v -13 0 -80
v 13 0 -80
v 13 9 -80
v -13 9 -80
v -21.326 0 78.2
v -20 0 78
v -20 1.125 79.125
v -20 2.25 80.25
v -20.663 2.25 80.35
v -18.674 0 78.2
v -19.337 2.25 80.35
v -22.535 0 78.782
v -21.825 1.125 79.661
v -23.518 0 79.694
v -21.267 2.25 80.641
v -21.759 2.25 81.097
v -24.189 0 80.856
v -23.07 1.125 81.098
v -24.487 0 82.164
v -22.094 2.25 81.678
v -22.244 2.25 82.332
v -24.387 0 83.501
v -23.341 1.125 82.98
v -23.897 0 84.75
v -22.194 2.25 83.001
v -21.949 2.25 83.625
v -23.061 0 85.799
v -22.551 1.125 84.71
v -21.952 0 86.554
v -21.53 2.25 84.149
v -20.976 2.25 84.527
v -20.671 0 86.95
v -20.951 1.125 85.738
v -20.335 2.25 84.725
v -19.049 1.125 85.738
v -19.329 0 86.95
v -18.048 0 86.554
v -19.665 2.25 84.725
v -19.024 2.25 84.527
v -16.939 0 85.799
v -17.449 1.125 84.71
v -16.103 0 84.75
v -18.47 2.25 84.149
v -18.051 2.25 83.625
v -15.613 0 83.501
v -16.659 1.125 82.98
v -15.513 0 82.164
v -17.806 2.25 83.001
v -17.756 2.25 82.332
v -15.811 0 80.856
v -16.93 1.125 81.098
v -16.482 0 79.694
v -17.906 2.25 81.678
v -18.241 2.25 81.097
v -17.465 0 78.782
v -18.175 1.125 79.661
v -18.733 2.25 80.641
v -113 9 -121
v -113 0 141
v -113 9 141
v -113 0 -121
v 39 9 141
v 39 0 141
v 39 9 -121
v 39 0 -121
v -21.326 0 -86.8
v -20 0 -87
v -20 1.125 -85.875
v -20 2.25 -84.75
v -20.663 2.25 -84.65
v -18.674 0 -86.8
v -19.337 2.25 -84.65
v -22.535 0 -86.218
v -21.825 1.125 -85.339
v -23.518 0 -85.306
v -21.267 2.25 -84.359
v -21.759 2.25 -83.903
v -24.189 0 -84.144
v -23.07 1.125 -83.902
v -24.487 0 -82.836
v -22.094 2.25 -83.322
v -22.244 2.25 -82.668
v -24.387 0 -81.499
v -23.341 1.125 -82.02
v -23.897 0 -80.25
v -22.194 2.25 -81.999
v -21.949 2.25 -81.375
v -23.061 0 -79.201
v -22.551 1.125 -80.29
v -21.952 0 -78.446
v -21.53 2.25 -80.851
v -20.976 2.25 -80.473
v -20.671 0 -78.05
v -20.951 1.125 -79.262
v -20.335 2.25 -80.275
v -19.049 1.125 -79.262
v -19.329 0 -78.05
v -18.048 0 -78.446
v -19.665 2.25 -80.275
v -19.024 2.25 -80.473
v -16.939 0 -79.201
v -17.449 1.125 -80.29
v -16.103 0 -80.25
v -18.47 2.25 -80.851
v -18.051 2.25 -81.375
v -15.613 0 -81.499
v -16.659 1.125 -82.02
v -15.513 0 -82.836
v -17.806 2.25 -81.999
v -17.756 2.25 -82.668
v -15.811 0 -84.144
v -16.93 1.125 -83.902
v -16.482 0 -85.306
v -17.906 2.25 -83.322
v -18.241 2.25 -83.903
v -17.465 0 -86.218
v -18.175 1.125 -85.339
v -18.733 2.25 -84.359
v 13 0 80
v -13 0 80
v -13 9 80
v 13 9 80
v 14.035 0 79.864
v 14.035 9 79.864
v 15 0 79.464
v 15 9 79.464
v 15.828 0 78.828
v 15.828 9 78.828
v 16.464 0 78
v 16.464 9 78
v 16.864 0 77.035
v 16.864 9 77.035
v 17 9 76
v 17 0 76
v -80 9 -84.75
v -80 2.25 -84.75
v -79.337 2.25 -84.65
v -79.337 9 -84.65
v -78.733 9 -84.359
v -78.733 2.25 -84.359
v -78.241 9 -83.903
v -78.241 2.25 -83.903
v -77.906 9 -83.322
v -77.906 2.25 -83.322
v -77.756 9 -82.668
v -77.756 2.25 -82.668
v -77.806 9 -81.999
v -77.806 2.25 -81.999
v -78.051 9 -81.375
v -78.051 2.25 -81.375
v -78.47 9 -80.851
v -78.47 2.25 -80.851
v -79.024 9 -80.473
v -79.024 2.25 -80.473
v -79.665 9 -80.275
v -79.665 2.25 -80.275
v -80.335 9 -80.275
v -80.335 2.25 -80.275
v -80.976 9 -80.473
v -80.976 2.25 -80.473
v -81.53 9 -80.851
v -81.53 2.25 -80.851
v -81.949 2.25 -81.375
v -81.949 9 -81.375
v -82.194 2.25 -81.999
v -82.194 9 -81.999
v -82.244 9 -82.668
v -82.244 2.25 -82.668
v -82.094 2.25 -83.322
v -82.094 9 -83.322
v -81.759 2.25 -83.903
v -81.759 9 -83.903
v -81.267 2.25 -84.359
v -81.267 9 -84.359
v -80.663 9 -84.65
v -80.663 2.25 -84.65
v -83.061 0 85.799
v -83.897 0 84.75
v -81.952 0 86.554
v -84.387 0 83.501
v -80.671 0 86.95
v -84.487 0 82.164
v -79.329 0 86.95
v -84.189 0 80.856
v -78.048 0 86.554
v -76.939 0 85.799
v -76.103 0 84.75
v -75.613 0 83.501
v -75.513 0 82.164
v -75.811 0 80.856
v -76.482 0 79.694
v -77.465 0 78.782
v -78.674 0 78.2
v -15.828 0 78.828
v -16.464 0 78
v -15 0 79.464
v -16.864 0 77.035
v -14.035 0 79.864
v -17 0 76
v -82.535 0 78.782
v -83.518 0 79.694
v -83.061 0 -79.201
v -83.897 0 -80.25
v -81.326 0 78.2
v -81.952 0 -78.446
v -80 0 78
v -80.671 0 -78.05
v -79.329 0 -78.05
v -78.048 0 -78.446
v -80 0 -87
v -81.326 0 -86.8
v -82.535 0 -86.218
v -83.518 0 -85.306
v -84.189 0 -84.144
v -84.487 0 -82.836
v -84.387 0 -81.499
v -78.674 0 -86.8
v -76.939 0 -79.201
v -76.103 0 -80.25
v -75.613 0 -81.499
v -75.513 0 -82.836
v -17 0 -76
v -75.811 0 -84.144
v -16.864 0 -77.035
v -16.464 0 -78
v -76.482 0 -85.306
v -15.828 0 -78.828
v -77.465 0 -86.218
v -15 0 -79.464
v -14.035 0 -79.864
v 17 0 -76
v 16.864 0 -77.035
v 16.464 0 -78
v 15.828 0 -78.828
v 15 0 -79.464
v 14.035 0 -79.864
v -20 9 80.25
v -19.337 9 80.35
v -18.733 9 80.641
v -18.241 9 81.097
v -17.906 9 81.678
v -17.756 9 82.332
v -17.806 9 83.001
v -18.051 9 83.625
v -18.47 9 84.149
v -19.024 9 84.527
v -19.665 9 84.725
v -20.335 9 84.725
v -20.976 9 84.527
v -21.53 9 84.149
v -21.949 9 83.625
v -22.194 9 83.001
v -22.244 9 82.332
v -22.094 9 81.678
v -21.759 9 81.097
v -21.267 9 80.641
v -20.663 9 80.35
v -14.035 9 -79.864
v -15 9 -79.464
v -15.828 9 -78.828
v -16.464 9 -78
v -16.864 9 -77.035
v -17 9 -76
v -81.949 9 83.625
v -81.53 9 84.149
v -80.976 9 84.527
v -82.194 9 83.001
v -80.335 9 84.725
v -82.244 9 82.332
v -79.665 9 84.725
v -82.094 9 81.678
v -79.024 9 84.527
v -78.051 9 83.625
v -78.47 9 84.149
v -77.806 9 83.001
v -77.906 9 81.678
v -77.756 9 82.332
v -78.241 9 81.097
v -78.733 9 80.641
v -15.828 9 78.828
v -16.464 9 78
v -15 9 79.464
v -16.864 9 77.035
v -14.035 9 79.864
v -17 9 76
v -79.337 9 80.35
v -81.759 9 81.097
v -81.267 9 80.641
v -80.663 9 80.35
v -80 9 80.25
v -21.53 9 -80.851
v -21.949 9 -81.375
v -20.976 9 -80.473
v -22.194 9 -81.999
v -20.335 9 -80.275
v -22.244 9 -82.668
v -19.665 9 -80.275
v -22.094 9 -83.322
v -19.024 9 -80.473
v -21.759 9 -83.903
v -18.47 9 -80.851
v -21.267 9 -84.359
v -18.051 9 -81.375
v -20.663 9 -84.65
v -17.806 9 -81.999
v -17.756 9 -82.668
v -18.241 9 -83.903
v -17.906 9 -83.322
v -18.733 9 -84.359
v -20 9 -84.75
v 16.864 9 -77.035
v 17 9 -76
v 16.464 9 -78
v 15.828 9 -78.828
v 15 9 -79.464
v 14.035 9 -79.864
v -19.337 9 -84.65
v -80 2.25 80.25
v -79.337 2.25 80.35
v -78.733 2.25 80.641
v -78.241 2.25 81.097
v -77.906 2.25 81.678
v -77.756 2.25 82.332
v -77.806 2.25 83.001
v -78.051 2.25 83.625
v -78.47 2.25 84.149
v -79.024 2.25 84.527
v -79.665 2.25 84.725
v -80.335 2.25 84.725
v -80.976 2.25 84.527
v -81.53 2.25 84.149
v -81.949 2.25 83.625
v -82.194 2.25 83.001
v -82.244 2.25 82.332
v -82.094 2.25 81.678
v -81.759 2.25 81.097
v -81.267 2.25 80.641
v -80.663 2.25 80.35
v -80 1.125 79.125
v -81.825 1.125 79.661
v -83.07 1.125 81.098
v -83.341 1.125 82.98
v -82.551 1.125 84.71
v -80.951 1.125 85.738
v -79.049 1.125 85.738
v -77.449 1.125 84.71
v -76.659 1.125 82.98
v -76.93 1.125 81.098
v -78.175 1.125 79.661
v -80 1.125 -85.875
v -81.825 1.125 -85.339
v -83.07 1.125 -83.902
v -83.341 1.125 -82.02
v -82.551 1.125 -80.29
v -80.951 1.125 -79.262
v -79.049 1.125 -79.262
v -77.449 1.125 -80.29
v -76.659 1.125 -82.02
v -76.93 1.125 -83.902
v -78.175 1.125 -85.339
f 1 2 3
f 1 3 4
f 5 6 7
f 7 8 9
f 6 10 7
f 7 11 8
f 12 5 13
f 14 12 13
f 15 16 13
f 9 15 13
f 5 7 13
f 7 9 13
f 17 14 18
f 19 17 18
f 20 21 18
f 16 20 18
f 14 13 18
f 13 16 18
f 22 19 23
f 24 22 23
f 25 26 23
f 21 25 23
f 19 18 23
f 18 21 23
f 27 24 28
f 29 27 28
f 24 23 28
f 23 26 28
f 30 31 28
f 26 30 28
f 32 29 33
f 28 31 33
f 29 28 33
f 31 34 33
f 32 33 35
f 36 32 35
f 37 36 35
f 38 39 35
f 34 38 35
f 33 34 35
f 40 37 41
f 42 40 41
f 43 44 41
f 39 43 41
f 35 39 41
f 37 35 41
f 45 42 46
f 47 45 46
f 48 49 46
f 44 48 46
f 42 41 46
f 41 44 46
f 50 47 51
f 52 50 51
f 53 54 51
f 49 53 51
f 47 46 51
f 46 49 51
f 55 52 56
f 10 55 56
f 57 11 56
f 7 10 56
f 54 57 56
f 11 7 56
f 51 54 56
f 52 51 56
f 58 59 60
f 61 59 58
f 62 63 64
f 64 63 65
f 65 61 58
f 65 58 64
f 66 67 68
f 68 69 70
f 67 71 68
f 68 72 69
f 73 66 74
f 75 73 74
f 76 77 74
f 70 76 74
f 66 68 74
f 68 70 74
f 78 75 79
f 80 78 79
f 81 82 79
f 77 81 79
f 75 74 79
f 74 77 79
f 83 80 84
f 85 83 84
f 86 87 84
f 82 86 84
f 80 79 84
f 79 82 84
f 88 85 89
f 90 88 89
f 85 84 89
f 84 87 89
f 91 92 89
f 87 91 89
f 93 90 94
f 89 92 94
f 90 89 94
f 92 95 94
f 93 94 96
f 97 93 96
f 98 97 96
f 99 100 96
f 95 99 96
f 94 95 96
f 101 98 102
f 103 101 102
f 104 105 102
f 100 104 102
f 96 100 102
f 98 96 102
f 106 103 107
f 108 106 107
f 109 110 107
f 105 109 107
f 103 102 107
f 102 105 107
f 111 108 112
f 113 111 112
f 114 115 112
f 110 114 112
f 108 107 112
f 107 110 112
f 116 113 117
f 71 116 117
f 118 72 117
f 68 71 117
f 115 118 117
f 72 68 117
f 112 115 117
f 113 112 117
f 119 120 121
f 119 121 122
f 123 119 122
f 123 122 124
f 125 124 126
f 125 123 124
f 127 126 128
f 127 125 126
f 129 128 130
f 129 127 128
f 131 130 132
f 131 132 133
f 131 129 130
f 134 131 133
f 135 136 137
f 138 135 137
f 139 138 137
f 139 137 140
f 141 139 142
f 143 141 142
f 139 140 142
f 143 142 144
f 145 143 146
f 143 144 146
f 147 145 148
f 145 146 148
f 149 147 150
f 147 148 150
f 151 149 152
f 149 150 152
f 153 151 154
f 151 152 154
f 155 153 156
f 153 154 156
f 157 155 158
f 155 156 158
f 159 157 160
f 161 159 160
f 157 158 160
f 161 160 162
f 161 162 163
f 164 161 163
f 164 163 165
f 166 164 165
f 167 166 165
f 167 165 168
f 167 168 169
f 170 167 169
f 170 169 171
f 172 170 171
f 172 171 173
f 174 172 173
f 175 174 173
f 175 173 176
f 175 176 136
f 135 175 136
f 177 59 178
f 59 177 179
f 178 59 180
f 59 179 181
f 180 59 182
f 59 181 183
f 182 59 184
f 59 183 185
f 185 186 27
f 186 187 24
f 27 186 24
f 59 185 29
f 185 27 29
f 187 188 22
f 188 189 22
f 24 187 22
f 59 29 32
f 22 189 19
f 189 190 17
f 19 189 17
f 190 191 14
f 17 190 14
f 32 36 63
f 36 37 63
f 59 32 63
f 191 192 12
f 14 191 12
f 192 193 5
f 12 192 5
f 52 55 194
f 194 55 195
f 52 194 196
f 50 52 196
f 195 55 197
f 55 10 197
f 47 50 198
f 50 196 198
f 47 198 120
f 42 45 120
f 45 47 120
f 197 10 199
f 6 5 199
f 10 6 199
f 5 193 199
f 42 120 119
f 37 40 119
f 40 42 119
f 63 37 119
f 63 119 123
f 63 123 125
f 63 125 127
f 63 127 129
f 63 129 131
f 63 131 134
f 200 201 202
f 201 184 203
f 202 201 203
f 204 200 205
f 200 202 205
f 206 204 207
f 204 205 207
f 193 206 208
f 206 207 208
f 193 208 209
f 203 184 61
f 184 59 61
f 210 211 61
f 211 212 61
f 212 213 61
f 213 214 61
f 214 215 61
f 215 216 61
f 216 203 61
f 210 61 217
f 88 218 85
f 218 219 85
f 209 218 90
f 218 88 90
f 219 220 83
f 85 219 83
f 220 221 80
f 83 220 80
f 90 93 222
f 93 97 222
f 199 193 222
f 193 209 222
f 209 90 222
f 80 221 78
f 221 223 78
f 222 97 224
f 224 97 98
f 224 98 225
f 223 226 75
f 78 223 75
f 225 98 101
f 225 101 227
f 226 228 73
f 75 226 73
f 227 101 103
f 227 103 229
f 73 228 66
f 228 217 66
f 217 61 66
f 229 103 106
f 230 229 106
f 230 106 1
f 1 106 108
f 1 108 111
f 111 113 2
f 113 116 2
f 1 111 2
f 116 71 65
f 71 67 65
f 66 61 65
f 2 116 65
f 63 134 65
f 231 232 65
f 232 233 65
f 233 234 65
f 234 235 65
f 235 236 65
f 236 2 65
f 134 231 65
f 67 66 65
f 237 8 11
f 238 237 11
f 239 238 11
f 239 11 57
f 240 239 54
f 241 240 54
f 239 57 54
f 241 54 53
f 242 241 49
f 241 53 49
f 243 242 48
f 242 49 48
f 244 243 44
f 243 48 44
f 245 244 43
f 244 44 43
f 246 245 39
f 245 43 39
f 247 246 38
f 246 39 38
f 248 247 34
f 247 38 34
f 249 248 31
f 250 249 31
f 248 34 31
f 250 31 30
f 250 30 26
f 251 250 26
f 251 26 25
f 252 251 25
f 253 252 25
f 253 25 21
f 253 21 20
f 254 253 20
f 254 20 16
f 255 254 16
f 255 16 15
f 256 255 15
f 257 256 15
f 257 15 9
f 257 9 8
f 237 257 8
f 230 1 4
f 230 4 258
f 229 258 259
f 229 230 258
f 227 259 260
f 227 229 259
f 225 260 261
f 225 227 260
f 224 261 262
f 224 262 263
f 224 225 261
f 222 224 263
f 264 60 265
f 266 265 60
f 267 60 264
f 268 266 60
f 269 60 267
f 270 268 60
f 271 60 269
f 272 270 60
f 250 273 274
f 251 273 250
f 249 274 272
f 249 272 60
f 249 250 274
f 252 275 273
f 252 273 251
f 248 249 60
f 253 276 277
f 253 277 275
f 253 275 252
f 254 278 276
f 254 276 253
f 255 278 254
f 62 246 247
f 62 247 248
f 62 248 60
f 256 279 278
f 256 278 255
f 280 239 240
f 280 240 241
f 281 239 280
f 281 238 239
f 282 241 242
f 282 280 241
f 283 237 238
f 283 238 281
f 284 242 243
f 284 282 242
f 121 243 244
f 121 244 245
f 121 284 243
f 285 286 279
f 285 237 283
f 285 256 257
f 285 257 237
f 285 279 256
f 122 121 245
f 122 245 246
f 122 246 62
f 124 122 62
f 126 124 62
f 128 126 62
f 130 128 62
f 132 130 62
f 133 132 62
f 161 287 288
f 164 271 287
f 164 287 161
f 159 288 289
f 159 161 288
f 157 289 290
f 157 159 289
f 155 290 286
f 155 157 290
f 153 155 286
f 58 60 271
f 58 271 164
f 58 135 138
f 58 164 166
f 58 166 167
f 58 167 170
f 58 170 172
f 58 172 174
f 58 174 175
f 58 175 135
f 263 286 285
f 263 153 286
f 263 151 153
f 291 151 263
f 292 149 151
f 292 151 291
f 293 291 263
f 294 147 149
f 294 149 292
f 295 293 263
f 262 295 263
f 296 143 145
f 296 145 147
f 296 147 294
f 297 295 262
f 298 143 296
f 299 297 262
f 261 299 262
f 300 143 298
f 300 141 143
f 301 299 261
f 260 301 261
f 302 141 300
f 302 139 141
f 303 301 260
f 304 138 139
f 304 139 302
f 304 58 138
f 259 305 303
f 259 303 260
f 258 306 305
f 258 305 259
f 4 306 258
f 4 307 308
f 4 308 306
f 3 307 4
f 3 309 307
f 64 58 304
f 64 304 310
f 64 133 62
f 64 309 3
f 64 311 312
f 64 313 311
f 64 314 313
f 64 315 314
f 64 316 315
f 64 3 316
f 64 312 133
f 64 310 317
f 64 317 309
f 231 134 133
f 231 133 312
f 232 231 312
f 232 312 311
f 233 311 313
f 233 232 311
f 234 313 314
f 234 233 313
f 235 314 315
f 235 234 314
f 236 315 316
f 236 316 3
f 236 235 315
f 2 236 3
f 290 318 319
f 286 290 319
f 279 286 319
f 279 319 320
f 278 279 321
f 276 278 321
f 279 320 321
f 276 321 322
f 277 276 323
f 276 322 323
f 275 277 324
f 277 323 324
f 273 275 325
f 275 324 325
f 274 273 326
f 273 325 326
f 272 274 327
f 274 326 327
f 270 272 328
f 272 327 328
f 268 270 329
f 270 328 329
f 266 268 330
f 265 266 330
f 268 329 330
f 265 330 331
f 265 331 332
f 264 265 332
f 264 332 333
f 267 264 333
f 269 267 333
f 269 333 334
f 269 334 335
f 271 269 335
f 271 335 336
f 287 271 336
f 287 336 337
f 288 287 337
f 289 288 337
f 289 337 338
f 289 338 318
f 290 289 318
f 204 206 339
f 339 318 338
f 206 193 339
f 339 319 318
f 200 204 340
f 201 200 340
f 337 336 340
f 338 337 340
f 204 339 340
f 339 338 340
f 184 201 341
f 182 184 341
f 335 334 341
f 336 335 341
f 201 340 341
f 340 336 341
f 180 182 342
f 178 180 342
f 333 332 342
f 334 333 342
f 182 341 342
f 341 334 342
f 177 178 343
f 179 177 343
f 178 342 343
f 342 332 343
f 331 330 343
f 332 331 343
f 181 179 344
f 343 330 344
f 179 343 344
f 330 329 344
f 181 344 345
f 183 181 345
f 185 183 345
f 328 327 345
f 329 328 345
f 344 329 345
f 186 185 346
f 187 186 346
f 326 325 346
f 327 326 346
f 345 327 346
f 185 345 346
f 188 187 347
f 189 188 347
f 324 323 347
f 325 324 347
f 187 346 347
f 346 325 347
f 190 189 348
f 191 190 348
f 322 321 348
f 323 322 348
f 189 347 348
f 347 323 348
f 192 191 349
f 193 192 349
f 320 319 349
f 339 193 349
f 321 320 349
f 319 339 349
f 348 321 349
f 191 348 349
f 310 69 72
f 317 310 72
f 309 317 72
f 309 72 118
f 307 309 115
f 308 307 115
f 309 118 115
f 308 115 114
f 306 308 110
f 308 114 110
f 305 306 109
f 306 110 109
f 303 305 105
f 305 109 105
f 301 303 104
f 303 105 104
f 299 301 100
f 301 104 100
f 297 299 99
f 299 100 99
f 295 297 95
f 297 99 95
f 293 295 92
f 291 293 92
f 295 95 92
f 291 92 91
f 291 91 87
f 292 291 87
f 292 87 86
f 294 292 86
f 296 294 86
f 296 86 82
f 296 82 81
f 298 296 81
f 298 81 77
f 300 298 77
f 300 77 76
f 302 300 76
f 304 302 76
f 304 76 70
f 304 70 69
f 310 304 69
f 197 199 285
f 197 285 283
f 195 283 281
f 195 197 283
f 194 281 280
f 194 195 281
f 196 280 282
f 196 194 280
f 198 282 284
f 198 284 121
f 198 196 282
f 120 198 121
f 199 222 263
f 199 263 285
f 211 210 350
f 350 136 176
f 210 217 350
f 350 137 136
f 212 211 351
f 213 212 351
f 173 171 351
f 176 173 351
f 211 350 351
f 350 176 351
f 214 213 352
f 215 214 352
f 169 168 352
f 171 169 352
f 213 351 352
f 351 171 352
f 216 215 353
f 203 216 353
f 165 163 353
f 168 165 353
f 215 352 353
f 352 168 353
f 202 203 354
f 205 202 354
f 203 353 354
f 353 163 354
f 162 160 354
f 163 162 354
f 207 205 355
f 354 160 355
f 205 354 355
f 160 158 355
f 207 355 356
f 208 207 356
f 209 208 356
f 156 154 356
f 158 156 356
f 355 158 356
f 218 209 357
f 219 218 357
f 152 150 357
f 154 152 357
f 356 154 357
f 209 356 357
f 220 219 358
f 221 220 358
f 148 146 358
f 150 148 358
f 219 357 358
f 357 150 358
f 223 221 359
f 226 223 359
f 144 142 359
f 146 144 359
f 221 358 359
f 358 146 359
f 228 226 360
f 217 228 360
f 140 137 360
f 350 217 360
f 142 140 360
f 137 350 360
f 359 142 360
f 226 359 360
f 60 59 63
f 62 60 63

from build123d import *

# Parameters (mm, degrees)
SKETCH1_W           = 152
SKETCH1_H           = 262
BOSS_EXTRUDE1_DEPTH = 9
SKETCH2_R           = 2.25
CUT_EXTRUDE1_DEPTH  = 181.917108091


with BuildPart() as part:
    # Sketch1 → Boss-Extrude1 (new body)
    with BuildSketch(Plane(origin=(0, 0, 0), x_dir=(1, 0, 0), z_dir=(0, 1, 0))):
        with Locations((-37, -10)):
            Rectangle(SKETCH1_W, SKETCH1_H)
        with BuildLine():
            Line((13, 80), (-13, 80))
            ThreePointArc((-13, 80), (-15.828427125, 78.828427125), (-17, 76))
            Line((-17, 76), (-17, -76))
            ThreePointArc((-17, -76), (-15.828427125, -78.828427125), (-13, -80))
            Line((-13, -80), (13, -80))
            ThreePointArc((13, -80), (15.828427125, -78.828427125), (17, -76))
            Line((17, -76), (17, 76))
            ThreePointArc((17, 76), (15.828427125, 78.828427125), (13, 80))
        make_face(mode=Mode.SUBTRACT)
    extrude(amount=BOSS_EXTRUDE1_DEPTH)

    # Sketch2 → Cut-Extrude1 (cut, through all)
    with BuildSketch(Plane.XZ):
        with Locations(Location((-20, 82.5, 0), (0, 0, 270))):
            Circle(SKETCH2_R)
        with Locations(Location((-80, 82.5, 0), (0, 0, 270))):
            Circle(SKETCH2_R)
        with Locations(Location((-20, -82.5, 0), (0, 0, 270))):
            Circle(SKETCH2_R)
        with Locations(Location((-80, -82.5, 0), (0, 0, 270))):
            Circle(SKETCH2_R)
    extrude(amount=-CUT_EXTRUDE1_DEPTH, mode=Mode.SUBTRACT)

    # Cut-Extrude2 cone 1 section (through the dimple's axis) → Cut-Extrude2 (revolve, cut)
    with BuildSketch(Plane(origin=(-80, 0, 82.5), x_dir=(0, 0, -1), z_dir=(1, 0, 0))):
        Polygon((0, 0), (4.5, 0), (0, 4.5), align=None)
    revolve(axis=Axis((-80, 0, 82.5), (0, 1, 0)), mode=Mode.SUBTRACT)

    # Cut-Extrude2 cone 2 section (through the dimple's axis) → Cut-Extrude2 cone 2 (revolve, cut)
    with BuildSketch(Plane(origin=(-20, 0, 82.5), x_dir=(0, 0, -1), z_dir=(1, 0, 0))):
        Polygon((0, 0), (4.5, 0), (0, 4.5), align=None)
    revolve(axis=Axis((-20, 0, 82.5), (0, 1, 0)), mode=Mode.SUBTRACT)

    # Cut-Extrude2 cone 3 section (through the dimple's axis) → Cut-Extrude2 cone 3 (revolve, cut)
    with BuildSketch(Plane(origin=(-20, 0, -82.5), x_dir=(0, 0, -1), z_dir=(1, 0, 0))):
        Polygon((0, 0), (4.5, 0), (0, 4.5), align=None)
    revolve(axis=Axis((-20, 0, -82.5), (0, 1, 0)), mode=Mode.SUBTRACT)

    # Cut-Extrude2 cone 4 section (through the dimple's axis) → Cut-Extrude2 cone 4 (revolve, cut)
    with BuildSketch(Plane(origin=(-80, 0, -82.5), x_dir=(0, 0, -1), z_dir=(1, 0, 0))):
        Polygon((0, 0), (4.5, 0), (0, 4.5), align=None)
    revolve(axis=Axis((-80, 0, -82.5), (0, 1, 0)), mode=Mode.SUBTRACT)


solid = part.part
